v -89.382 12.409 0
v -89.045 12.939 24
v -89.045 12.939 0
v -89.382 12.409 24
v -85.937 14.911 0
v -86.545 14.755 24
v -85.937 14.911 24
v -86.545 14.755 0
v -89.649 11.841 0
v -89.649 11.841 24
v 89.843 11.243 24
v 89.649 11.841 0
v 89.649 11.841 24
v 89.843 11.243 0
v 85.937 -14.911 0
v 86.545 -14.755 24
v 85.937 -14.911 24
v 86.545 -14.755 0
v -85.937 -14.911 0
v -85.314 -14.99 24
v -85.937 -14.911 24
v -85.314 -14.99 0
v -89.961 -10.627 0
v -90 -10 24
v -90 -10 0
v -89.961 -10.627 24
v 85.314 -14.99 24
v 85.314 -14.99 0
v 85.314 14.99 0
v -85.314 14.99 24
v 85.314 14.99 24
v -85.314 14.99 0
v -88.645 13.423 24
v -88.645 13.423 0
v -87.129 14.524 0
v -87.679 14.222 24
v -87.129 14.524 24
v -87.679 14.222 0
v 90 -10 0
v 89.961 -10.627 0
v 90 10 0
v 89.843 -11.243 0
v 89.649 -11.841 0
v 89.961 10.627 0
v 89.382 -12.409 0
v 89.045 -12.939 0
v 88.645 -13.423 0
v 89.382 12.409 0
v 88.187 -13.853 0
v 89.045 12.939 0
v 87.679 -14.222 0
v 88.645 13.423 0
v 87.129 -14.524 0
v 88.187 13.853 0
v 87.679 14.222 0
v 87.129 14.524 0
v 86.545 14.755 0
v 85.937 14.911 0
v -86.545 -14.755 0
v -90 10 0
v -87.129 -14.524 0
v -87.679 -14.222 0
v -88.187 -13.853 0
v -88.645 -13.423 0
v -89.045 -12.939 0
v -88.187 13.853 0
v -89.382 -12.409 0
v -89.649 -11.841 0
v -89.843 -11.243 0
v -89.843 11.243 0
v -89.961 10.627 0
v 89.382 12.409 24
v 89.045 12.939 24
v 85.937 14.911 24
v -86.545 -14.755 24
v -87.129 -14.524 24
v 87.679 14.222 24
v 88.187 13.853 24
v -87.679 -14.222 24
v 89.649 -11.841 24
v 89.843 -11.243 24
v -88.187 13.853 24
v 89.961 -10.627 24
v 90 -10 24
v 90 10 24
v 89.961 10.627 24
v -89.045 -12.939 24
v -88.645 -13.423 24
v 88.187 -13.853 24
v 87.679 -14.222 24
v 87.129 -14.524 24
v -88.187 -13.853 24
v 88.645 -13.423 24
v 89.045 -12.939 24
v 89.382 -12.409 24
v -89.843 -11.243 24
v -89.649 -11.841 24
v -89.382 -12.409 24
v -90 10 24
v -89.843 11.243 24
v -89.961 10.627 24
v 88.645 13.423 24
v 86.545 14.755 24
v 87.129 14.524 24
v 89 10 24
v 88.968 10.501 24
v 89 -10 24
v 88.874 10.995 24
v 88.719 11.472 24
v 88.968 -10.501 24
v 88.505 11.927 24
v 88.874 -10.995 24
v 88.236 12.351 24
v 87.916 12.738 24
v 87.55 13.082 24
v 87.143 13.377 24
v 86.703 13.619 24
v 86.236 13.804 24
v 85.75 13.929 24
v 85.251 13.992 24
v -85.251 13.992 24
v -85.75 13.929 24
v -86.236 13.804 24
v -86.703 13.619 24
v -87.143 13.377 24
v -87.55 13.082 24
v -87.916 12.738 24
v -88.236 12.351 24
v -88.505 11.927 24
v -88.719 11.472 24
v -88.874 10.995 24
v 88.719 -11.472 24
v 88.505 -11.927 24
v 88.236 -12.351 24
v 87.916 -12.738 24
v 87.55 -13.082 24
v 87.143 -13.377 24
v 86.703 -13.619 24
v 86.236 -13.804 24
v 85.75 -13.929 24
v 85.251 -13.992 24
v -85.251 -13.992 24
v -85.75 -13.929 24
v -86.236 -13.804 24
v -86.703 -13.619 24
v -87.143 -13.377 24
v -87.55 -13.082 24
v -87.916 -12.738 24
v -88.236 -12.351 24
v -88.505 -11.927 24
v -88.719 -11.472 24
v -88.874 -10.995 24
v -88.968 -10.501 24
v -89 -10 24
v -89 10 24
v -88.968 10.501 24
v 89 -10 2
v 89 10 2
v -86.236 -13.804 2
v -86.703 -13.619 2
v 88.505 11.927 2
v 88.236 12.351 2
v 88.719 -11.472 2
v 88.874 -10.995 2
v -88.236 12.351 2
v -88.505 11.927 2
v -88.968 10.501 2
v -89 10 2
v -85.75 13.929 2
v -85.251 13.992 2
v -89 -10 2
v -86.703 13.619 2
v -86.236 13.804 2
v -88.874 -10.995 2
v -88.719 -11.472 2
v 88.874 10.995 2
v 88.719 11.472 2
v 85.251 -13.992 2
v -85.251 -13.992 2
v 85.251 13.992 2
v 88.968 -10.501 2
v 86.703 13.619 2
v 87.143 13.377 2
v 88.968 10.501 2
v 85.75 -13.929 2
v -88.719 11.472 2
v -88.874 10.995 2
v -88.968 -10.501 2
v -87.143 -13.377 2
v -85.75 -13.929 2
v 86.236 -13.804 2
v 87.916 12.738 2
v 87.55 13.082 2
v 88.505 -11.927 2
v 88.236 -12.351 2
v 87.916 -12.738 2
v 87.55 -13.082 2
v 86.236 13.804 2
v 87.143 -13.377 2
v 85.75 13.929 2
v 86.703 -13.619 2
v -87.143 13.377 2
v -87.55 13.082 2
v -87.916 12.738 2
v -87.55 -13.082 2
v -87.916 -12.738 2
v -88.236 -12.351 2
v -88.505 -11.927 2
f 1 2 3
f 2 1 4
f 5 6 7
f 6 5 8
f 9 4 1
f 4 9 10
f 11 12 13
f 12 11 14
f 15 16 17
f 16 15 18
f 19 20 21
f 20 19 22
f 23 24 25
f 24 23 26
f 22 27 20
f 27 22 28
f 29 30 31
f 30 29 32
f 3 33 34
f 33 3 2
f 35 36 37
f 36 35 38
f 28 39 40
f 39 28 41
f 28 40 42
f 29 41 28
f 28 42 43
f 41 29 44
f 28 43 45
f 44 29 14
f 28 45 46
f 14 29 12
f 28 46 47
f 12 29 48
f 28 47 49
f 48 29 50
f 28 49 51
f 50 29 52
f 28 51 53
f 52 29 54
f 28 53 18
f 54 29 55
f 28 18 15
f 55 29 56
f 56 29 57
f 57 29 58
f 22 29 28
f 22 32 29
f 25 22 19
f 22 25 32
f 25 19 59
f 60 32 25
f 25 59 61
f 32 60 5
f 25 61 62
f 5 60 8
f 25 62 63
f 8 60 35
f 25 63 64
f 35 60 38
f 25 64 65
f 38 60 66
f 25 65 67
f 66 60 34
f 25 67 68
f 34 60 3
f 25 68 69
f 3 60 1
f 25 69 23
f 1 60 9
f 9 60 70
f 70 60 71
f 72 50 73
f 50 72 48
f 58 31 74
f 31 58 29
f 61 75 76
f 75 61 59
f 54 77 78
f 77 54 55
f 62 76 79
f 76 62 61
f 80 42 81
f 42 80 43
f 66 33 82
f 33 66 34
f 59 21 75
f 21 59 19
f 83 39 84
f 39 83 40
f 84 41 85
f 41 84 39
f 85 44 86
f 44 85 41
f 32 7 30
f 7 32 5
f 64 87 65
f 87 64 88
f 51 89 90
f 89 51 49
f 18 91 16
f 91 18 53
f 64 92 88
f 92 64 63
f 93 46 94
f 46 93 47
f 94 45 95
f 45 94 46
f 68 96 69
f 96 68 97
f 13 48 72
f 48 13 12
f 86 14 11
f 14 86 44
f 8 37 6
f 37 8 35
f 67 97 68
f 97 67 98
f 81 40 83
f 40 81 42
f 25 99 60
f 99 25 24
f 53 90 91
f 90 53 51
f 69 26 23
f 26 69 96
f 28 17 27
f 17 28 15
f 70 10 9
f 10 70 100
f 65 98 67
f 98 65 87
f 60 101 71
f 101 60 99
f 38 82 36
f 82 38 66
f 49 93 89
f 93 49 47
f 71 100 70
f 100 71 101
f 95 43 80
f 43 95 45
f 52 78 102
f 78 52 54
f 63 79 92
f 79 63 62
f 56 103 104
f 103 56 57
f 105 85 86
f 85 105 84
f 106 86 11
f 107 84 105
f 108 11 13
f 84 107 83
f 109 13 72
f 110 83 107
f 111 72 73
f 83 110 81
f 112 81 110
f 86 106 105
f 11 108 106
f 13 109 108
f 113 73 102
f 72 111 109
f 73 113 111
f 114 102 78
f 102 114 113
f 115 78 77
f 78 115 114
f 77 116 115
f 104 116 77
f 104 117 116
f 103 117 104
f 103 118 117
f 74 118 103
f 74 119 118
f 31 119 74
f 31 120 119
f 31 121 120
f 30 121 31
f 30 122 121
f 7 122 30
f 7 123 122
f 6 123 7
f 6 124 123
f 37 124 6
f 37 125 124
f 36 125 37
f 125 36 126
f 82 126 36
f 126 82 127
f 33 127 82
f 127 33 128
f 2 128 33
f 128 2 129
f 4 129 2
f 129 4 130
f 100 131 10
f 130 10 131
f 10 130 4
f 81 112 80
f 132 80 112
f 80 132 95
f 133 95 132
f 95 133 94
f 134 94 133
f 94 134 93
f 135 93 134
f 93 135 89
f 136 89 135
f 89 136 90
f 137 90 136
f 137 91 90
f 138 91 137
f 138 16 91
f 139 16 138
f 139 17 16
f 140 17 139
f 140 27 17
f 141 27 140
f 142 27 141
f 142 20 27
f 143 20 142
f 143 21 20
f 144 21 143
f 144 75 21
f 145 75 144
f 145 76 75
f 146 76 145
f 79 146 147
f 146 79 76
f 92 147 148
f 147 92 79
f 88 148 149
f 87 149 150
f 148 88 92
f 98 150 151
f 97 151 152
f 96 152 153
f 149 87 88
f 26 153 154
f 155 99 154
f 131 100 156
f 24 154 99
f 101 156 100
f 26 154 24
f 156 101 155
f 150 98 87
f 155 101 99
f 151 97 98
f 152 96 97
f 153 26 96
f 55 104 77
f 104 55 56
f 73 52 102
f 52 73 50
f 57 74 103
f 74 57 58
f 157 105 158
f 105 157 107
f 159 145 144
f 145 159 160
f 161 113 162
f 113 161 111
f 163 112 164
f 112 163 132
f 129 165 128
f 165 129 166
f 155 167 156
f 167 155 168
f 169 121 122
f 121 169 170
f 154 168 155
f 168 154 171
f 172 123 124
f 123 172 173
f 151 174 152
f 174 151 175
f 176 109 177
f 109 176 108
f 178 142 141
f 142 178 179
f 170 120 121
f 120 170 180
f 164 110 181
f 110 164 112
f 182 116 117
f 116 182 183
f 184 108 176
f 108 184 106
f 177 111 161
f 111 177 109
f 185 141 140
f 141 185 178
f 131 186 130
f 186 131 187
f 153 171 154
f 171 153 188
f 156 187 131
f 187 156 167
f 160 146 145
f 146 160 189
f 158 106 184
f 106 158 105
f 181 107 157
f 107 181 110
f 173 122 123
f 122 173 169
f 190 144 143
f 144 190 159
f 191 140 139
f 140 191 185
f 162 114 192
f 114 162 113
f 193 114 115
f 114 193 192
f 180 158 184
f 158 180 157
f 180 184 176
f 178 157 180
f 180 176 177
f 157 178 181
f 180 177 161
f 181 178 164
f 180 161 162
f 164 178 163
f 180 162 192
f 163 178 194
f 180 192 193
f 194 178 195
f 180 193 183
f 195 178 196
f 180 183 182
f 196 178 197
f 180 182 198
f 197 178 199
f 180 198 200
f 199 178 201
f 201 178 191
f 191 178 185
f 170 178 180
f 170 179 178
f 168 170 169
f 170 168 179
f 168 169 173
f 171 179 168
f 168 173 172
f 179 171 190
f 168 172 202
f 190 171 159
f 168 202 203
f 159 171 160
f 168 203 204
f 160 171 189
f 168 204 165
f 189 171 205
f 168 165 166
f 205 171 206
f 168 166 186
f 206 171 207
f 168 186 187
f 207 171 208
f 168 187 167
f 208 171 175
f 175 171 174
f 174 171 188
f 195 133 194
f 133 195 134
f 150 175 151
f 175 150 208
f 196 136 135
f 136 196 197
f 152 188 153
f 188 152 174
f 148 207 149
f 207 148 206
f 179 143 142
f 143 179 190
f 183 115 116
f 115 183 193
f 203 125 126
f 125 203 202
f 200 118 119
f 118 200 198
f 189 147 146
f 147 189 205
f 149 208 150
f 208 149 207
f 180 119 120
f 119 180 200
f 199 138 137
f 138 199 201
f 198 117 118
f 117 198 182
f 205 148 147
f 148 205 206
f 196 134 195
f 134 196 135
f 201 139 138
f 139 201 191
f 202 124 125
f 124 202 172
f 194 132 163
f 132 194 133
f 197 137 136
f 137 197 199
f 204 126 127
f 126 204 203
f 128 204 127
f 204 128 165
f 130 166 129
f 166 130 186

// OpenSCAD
$fn = 50;


difference() {
	union() {
		hull() {
			translate(v = [-85.0000000000, 10.0000000000, 0]) {
				cylinder(h = 24, r = 5);
			}
			translate(v = [85.0000000000, 10.0000000000, 0]) {
				cylinder(h = 24, r = 5);
			}
			translate(v = [-85.0000000000, -10.0000000000, 0]) {
				cylinder(h = 24, r = 5);
			}
			translate(v = [85.0000000000, -10.0000000000, 0]) {
				cylinder(h = 24, r = 5);
			}
		}
	}
	union() {
		translate(v = [0, 0, 2]) {
			hull() {
				translate(v = [-85.0000000000, 10.0000000000, 0]) {
					cylinder(h = 22, r = 4);
				}
				translate(v = [85.0000000000, 10.0000000000, 0]) {
					cylinder(h = 22, r = 4);
				}
				translate(v = [-85.0000000000, -10.0000000000, 0]) {
					cylinder(h = 22, r = 4);
				}
				translate(v = [85.0000000000, -10.0000000000, 0]) {
					cylinder(h = 22, r = 4);
				}
			}
		}
	}
}
